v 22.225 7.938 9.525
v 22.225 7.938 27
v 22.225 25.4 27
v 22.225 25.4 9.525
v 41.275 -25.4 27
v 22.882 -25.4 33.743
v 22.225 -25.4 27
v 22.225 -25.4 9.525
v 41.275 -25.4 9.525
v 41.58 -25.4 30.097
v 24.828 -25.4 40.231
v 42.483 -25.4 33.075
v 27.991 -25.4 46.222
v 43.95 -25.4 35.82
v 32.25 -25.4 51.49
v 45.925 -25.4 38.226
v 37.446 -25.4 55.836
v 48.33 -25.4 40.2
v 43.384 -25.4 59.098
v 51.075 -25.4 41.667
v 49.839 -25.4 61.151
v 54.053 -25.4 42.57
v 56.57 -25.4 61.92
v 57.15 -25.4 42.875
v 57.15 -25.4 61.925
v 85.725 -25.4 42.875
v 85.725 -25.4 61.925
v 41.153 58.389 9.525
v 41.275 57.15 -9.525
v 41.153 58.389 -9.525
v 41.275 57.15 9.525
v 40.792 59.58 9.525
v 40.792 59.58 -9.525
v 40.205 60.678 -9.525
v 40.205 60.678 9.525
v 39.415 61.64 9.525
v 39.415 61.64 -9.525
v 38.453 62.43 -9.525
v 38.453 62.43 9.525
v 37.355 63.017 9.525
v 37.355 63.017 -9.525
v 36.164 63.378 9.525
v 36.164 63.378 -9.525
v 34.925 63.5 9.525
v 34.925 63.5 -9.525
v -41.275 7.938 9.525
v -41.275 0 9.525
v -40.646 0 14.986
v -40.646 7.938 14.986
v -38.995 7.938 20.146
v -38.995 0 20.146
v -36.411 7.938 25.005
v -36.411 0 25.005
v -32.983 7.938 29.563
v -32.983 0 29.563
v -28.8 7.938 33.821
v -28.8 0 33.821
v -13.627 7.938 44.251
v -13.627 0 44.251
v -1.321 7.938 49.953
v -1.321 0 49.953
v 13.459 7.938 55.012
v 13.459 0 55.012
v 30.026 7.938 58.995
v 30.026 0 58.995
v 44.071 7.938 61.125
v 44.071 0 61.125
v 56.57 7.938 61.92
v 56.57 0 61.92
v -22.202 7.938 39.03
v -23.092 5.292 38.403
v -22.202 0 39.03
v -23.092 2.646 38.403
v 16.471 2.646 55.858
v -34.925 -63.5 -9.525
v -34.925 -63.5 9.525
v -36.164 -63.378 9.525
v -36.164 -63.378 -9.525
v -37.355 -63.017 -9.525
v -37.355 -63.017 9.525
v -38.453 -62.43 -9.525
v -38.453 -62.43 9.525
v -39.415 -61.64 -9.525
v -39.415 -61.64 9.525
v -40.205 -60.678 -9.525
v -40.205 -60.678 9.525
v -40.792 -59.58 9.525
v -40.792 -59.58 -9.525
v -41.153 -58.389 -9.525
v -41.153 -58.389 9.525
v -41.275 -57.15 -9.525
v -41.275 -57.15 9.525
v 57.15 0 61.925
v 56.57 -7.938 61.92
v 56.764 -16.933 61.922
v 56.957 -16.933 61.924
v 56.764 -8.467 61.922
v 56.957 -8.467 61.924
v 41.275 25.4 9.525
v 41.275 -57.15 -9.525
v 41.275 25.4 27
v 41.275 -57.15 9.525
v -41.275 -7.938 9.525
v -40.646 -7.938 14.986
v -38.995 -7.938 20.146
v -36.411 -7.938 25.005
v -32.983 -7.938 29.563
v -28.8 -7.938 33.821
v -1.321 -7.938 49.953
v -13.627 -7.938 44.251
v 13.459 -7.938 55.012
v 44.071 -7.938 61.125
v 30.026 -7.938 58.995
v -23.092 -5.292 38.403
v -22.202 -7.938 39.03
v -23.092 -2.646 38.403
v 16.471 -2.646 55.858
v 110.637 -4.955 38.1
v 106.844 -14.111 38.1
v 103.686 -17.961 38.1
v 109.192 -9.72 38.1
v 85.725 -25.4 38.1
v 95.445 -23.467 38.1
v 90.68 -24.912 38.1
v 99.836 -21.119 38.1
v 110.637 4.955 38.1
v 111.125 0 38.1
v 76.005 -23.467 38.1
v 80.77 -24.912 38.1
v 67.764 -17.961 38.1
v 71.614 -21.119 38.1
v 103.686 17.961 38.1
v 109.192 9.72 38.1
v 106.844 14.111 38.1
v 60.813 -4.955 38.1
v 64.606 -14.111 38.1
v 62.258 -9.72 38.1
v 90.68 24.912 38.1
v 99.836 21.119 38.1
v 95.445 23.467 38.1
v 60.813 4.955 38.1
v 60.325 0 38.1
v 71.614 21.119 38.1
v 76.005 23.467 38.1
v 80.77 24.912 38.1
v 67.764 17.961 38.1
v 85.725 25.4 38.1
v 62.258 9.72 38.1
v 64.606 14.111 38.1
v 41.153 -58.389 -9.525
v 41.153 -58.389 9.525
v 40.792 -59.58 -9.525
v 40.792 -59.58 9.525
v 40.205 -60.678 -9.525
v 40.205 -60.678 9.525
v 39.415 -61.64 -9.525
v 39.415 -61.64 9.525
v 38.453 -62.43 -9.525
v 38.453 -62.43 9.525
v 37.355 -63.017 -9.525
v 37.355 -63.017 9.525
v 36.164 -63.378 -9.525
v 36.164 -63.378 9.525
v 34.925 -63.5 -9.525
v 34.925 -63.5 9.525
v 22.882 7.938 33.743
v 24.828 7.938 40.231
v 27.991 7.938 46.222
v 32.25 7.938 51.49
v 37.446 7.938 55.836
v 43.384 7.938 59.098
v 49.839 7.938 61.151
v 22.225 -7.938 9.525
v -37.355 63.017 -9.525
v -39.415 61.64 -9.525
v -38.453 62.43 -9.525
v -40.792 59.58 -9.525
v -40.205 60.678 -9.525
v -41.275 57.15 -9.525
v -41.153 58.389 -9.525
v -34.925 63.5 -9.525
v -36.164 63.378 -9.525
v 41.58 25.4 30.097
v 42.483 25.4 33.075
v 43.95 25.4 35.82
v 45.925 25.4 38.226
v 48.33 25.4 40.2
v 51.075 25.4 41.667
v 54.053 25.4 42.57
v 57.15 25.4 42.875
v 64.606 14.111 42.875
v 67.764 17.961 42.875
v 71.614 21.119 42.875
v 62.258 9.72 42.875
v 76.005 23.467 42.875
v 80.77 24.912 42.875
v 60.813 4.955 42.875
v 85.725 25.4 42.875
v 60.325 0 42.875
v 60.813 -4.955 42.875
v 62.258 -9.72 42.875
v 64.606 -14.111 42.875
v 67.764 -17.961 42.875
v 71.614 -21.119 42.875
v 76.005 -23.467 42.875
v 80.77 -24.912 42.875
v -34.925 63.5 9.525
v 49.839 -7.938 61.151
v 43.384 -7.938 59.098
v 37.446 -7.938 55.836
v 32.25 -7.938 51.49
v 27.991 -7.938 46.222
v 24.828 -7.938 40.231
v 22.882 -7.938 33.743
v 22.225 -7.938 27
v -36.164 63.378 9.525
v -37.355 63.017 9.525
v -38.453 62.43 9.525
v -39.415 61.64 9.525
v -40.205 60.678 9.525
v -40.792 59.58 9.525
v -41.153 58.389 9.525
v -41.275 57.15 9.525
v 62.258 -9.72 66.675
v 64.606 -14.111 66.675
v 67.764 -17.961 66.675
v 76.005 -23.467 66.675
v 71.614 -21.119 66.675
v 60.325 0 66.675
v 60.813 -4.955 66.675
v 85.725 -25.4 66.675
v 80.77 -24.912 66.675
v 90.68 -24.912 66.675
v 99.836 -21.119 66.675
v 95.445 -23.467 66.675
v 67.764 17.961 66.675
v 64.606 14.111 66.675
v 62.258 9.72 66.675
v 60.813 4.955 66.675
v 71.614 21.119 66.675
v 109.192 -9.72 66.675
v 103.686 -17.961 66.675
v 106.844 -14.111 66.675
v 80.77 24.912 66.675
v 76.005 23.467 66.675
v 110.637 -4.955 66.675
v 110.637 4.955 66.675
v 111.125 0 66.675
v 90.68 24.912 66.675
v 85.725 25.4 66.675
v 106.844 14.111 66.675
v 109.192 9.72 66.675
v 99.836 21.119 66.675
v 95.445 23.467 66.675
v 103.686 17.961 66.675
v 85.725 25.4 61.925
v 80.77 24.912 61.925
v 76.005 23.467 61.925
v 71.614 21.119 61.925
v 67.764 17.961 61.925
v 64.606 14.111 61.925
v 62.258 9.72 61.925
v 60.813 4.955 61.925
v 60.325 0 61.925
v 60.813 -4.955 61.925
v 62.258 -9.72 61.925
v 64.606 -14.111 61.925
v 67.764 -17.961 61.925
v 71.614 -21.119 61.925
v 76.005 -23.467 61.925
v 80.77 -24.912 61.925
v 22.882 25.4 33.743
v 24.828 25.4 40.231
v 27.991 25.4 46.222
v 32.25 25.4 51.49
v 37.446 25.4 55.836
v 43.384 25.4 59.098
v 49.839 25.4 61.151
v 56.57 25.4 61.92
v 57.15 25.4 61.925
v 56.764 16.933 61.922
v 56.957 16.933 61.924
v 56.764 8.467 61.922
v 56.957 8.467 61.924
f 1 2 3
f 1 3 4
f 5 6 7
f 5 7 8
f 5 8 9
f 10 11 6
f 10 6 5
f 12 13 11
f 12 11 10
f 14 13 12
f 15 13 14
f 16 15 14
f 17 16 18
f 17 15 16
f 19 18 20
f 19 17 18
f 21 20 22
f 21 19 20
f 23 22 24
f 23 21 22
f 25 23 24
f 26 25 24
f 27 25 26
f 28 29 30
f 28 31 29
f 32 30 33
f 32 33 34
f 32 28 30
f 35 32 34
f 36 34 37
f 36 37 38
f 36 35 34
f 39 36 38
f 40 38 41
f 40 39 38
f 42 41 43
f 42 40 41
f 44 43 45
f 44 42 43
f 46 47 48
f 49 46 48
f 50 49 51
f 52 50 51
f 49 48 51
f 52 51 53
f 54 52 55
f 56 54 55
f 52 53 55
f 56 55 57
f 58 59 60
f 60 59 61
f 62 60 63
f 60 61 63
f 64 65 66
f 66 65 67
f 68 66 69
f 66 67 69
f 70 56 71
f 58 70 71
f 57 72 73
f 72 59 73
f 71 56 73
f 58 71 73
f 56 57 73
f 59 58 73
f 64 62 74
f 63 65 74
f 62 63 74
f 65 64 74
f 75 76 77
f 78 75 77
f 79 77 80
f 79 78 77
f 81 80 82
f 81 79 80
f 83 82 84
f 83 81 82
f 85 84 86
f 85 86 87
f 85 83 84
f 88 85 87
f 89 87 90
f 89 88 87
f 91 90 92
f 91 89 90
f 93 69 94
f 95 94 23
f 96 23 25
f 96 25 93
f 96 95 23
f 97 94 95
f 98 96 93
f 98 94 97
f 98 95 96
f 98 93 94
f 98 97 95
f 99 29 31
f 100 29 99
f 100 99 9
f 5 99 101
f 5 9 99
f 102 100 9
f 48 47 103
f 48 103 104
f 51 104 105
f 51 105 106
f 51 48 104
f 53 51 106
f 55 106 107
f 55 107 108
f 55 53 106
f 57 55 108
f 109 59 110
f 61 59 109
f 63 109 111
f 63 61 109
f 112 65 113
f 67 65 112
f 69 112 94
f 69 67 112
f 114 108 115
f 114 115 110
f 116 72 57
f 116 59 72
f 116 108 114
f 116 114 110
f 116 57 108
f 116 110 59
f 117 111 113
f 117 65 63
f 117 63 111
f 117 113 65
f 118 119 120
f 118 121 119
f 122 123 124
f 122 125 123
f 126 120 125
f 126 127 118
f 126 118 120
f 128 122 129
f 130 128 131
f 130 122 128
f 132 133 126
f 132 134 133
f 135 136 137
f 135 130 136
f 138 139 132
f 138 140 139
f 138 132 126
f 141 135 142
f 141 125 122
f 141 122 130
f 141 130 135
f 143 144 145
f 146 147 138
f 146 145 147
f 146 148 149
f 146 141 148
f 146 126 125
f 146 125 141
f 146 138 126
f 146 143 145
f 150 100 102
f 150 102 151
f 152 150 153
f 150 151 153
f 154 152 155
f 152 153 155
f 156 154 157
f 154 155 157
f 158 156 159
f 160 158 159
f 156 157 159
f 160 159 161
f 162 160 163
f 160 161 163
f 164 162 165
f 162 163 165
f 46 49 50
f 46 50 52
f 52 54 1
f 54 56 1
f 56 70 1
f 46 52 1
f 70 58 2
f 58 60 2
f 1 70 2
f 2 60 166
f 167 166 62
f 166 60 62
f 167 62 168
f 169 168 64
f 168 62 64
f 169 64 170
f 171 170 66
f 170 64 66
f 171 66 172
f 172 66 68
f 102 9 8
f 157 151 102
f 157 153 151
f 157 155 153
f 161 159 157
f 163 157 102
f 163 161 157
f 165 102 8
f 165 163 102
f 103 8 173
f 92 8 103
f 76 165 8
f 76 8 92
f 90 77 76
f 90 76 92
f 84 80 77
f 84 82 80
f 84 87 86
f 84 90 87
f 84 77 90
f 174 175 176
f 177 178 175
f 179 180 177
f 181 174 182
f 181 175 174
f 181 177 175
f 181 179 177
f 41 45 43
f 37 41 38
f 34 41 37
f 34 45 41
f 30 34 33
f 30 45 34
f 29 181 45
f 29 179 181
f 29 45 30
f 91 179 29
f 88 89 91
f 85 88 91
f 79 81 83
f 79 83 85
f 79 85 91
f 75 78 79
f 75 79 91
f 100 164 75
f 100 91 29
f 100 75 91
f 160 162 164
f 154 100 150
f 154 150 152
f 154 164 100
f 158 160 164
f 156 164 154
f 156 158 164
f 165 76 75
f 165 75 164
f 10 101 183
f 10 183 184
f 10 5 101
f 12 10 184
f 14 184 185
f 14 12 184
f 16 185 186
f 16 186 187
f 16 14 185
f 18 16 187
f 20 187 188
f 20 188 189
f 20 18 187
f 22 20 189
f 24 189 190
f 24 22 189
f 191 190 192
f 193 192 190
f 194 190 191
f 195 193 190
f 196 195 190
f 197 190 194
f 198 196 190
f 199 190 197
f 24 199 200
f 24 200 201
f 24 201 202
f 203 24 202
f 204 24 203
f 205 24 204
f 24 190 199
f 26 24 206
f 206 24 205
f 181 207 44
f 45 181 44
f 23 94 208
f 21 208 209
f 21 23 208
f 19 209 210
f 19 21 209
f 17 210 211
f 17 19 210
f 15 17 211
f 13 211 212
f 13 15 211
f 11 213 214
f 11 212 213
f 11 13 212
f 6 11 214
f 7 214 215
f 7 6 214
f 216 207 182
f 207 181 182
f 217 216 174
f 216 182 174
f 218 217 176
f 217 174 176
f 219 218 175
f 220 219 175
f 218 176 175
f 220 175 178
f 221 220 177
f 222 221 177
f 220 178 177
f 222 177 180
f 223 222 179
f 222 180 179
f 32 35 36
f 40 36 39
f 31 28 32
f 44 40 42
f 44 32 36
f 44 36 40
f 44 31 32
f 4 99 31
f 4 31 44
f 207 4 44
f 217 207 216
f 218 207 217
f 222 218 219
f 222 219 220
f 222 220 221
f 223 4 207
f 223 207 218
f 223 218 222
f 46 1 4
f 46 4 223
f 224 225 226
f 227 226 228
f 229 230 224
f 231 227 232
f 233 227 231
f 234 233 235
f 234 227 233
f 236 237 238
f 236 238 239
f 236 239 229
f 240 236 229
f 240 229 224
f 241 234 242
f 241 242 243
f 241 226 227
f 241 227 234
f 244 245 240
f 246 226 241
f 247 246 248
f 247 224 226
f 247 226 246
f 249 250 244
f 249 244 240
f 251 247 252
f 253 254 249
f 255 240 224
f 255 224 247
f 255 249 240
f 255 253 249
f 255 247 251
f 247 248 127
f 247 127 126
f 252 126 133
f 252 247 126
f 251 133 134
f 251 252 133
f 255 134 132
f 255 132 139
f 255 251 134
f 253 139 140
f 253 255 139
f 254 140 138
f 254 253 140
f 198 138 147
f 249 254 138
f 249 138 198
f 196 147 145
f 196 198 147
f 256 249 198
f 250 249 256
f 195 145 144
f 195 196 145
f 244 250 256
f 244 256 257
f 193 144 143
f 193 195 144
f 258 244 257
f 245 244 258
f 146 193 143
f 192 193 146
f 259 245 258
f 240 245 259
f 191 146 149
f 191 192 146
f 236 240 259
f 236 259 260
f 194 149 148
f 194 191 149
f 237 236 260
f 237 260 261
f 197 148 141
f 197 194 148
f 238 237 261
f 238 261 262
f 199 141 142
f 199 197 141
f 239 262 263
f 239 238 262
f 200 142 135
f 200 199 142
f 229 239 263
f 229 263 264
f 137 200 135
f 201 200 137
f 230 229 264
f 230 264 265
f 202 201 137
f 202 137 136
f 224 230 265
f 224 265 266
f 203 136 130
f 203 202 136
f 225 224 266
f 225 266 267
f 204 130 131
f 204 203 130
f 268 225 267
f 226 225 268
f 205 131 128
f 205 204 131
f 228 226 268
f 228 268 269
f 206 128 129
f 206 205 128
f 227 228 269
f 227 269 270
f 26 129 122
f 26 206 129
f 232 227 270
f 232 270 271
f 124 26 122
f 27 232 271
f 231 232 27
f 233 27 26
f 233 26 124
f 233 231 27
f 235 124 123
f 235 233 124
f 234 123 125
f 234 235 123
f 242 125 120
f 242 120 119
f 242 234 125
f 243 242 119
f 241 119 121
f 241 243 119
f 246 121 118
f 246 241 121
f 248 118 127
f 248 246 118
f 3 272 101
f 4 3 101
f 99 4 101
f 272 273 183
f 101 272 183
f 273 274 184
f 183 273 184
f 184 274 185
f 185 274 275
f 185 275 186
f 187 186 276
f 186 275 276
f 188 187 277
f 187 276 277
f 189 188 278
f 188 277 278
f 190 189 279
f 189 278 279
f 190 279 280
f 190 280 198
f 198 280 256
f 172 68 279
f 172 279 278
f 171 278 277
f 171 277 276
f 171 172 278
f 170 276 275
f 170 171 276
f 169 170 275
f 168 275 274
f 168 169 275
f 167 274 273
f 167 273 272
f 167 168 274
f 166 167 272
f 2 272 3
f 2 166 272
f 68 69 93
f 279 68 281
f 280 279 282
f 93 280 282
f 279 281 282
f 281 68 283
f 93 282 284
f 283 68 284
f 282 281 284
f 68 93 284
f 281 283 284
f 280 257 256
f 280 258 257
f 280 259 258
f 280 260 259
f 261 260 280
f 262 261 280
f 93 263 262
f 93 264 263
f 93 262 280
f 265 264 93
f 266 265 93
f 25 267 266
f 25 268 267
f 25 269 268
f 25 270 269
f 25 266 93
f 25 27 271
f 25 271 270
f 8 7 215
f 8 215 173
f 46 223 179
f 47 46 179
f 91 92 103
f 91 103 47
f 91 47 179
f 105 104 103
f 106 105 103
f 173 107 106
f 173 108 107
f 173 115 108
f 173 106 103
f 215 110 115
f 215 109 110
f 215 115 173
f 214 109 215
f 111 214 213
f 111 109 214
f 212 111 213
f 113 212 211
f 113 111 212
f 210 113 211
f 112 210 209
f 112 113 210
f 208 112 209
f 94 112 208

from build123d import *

# Parameters (mm, degrees)
F1_DEPTH = 63.5
F0_W     = 25.4
F0_H     = 19.05
F2_DEPTH = 25.4
F3_DEPTH = 7.9375
F5_R     = 6.35


with BuildPart() as f1:
    # F0 (on Front) → F1 (new body, symmetric)
    with BuildSketch(Plane.XZ):
        Polygon((41.275, -9.525), (41.275, 9.525), (22.225, 9.525), (-41.275, 9.525), (-41.275, -9.525), align=None)
    extrude(amount=F1_DEPTH, both=True)

    # F0 (on Front) → F2 (join, symmetric)
    with BuildSketch(Plane.XZ):
        with BuildLine():
            Line((22.225, 9.525), (41.275, 9.525))
            Line((41.275, 9.525), (41.275, 27.0002))
            ThreePointArc((41.275, 27.0002), (45.9246798487, 38.2255201513), (57.15, 42.8752))
            Line((57.15, 42.8752), (60.325, 42.8752))
            Line((60.325, 42.8752), (60.325, 61.9252))
            Line((60.325, 61.9252), (57.15, 61.9252))
            add(Edge.make_bspline(
                [(56.5697529207, 61.9203795288), (56.7642060535, 61.9225634714), (56.9576279056, 61.9241702866), (57.15, 61.9252)],
                knots=[110.8594899862, 110.8594899862, 110.8594899862, 110.8594899862, 111.5045361635, 111.5045361635, 111.5045361635, 111.5045361635], degree=3))
            ThreePointArc((56.5697529207, 61.9203795288), (32.2499924273, 51.4898967698), (22.225, 27.0002))
            Line((22.225, 27.0002), (22.225, 9.525))
        make_face()
        Polygon((41.275, -9.525), (41.275, 9.525), (22.225, 9.525), (-41.275, 9.525), (-41.275, -9.525), align=None)
        with Locations((73.025, 52.4002)):
            Rectangle(F0_W, F0_H)
    extrude(amount=F2_DEPTH, both=True)

    # F0 (on Front) → F3 (join, symmetric)
    with BuildSketch(Plane.XZ):
        with BuildLine():
            Line((-41.275, 9.525), (22.225, 9.525))
            Line((22.225, 9.525), (22.225, 27.0002))
            ThreePointArc((22.225, 27.0002), (32.2499924273, 51.4898967698), (56.5697529207, 61.9203795288))
            add(Edge.make_bspline(
                [(-41.275, 9.525), (-40.7295745203, 44.1231784774), (23.1504786353, 61.5450408791), (56.5697529207, 61.9203795288)],
                knots=[0, 0, 0, 0, 110.8594899862, 110.8594899862, 110.8594899862, 110.8594899862], degree=3))
        make_face()
    extrude(amount=F3_DEPTH, both=True)

    # F0 (on Front) → F4 (revolve)
    with BuildSketch(Plane.XZ):
        Polygon((85.725, 61.9252), (85.725, 42.8752), (85.725, 38.1), (111.125, 38.1), (111.125, 66.675), (85.725, 66.675), align=None)
    revolve(axis=Axis((85.725, 0, 52.3875), (0, 0, 1)))

    # F5
    f5_edges = [f1.edges().sort_by_distance(p)[0] for p in [
        (-41.275, -63.5, 0),
        (41.275, -63.5, 0),
        (41.275, 63.5, 0),
        (-41.275, 63.5, 0),
    ]]
    fillet(f5_edges, radius=F5_R)


solid = f1.part
